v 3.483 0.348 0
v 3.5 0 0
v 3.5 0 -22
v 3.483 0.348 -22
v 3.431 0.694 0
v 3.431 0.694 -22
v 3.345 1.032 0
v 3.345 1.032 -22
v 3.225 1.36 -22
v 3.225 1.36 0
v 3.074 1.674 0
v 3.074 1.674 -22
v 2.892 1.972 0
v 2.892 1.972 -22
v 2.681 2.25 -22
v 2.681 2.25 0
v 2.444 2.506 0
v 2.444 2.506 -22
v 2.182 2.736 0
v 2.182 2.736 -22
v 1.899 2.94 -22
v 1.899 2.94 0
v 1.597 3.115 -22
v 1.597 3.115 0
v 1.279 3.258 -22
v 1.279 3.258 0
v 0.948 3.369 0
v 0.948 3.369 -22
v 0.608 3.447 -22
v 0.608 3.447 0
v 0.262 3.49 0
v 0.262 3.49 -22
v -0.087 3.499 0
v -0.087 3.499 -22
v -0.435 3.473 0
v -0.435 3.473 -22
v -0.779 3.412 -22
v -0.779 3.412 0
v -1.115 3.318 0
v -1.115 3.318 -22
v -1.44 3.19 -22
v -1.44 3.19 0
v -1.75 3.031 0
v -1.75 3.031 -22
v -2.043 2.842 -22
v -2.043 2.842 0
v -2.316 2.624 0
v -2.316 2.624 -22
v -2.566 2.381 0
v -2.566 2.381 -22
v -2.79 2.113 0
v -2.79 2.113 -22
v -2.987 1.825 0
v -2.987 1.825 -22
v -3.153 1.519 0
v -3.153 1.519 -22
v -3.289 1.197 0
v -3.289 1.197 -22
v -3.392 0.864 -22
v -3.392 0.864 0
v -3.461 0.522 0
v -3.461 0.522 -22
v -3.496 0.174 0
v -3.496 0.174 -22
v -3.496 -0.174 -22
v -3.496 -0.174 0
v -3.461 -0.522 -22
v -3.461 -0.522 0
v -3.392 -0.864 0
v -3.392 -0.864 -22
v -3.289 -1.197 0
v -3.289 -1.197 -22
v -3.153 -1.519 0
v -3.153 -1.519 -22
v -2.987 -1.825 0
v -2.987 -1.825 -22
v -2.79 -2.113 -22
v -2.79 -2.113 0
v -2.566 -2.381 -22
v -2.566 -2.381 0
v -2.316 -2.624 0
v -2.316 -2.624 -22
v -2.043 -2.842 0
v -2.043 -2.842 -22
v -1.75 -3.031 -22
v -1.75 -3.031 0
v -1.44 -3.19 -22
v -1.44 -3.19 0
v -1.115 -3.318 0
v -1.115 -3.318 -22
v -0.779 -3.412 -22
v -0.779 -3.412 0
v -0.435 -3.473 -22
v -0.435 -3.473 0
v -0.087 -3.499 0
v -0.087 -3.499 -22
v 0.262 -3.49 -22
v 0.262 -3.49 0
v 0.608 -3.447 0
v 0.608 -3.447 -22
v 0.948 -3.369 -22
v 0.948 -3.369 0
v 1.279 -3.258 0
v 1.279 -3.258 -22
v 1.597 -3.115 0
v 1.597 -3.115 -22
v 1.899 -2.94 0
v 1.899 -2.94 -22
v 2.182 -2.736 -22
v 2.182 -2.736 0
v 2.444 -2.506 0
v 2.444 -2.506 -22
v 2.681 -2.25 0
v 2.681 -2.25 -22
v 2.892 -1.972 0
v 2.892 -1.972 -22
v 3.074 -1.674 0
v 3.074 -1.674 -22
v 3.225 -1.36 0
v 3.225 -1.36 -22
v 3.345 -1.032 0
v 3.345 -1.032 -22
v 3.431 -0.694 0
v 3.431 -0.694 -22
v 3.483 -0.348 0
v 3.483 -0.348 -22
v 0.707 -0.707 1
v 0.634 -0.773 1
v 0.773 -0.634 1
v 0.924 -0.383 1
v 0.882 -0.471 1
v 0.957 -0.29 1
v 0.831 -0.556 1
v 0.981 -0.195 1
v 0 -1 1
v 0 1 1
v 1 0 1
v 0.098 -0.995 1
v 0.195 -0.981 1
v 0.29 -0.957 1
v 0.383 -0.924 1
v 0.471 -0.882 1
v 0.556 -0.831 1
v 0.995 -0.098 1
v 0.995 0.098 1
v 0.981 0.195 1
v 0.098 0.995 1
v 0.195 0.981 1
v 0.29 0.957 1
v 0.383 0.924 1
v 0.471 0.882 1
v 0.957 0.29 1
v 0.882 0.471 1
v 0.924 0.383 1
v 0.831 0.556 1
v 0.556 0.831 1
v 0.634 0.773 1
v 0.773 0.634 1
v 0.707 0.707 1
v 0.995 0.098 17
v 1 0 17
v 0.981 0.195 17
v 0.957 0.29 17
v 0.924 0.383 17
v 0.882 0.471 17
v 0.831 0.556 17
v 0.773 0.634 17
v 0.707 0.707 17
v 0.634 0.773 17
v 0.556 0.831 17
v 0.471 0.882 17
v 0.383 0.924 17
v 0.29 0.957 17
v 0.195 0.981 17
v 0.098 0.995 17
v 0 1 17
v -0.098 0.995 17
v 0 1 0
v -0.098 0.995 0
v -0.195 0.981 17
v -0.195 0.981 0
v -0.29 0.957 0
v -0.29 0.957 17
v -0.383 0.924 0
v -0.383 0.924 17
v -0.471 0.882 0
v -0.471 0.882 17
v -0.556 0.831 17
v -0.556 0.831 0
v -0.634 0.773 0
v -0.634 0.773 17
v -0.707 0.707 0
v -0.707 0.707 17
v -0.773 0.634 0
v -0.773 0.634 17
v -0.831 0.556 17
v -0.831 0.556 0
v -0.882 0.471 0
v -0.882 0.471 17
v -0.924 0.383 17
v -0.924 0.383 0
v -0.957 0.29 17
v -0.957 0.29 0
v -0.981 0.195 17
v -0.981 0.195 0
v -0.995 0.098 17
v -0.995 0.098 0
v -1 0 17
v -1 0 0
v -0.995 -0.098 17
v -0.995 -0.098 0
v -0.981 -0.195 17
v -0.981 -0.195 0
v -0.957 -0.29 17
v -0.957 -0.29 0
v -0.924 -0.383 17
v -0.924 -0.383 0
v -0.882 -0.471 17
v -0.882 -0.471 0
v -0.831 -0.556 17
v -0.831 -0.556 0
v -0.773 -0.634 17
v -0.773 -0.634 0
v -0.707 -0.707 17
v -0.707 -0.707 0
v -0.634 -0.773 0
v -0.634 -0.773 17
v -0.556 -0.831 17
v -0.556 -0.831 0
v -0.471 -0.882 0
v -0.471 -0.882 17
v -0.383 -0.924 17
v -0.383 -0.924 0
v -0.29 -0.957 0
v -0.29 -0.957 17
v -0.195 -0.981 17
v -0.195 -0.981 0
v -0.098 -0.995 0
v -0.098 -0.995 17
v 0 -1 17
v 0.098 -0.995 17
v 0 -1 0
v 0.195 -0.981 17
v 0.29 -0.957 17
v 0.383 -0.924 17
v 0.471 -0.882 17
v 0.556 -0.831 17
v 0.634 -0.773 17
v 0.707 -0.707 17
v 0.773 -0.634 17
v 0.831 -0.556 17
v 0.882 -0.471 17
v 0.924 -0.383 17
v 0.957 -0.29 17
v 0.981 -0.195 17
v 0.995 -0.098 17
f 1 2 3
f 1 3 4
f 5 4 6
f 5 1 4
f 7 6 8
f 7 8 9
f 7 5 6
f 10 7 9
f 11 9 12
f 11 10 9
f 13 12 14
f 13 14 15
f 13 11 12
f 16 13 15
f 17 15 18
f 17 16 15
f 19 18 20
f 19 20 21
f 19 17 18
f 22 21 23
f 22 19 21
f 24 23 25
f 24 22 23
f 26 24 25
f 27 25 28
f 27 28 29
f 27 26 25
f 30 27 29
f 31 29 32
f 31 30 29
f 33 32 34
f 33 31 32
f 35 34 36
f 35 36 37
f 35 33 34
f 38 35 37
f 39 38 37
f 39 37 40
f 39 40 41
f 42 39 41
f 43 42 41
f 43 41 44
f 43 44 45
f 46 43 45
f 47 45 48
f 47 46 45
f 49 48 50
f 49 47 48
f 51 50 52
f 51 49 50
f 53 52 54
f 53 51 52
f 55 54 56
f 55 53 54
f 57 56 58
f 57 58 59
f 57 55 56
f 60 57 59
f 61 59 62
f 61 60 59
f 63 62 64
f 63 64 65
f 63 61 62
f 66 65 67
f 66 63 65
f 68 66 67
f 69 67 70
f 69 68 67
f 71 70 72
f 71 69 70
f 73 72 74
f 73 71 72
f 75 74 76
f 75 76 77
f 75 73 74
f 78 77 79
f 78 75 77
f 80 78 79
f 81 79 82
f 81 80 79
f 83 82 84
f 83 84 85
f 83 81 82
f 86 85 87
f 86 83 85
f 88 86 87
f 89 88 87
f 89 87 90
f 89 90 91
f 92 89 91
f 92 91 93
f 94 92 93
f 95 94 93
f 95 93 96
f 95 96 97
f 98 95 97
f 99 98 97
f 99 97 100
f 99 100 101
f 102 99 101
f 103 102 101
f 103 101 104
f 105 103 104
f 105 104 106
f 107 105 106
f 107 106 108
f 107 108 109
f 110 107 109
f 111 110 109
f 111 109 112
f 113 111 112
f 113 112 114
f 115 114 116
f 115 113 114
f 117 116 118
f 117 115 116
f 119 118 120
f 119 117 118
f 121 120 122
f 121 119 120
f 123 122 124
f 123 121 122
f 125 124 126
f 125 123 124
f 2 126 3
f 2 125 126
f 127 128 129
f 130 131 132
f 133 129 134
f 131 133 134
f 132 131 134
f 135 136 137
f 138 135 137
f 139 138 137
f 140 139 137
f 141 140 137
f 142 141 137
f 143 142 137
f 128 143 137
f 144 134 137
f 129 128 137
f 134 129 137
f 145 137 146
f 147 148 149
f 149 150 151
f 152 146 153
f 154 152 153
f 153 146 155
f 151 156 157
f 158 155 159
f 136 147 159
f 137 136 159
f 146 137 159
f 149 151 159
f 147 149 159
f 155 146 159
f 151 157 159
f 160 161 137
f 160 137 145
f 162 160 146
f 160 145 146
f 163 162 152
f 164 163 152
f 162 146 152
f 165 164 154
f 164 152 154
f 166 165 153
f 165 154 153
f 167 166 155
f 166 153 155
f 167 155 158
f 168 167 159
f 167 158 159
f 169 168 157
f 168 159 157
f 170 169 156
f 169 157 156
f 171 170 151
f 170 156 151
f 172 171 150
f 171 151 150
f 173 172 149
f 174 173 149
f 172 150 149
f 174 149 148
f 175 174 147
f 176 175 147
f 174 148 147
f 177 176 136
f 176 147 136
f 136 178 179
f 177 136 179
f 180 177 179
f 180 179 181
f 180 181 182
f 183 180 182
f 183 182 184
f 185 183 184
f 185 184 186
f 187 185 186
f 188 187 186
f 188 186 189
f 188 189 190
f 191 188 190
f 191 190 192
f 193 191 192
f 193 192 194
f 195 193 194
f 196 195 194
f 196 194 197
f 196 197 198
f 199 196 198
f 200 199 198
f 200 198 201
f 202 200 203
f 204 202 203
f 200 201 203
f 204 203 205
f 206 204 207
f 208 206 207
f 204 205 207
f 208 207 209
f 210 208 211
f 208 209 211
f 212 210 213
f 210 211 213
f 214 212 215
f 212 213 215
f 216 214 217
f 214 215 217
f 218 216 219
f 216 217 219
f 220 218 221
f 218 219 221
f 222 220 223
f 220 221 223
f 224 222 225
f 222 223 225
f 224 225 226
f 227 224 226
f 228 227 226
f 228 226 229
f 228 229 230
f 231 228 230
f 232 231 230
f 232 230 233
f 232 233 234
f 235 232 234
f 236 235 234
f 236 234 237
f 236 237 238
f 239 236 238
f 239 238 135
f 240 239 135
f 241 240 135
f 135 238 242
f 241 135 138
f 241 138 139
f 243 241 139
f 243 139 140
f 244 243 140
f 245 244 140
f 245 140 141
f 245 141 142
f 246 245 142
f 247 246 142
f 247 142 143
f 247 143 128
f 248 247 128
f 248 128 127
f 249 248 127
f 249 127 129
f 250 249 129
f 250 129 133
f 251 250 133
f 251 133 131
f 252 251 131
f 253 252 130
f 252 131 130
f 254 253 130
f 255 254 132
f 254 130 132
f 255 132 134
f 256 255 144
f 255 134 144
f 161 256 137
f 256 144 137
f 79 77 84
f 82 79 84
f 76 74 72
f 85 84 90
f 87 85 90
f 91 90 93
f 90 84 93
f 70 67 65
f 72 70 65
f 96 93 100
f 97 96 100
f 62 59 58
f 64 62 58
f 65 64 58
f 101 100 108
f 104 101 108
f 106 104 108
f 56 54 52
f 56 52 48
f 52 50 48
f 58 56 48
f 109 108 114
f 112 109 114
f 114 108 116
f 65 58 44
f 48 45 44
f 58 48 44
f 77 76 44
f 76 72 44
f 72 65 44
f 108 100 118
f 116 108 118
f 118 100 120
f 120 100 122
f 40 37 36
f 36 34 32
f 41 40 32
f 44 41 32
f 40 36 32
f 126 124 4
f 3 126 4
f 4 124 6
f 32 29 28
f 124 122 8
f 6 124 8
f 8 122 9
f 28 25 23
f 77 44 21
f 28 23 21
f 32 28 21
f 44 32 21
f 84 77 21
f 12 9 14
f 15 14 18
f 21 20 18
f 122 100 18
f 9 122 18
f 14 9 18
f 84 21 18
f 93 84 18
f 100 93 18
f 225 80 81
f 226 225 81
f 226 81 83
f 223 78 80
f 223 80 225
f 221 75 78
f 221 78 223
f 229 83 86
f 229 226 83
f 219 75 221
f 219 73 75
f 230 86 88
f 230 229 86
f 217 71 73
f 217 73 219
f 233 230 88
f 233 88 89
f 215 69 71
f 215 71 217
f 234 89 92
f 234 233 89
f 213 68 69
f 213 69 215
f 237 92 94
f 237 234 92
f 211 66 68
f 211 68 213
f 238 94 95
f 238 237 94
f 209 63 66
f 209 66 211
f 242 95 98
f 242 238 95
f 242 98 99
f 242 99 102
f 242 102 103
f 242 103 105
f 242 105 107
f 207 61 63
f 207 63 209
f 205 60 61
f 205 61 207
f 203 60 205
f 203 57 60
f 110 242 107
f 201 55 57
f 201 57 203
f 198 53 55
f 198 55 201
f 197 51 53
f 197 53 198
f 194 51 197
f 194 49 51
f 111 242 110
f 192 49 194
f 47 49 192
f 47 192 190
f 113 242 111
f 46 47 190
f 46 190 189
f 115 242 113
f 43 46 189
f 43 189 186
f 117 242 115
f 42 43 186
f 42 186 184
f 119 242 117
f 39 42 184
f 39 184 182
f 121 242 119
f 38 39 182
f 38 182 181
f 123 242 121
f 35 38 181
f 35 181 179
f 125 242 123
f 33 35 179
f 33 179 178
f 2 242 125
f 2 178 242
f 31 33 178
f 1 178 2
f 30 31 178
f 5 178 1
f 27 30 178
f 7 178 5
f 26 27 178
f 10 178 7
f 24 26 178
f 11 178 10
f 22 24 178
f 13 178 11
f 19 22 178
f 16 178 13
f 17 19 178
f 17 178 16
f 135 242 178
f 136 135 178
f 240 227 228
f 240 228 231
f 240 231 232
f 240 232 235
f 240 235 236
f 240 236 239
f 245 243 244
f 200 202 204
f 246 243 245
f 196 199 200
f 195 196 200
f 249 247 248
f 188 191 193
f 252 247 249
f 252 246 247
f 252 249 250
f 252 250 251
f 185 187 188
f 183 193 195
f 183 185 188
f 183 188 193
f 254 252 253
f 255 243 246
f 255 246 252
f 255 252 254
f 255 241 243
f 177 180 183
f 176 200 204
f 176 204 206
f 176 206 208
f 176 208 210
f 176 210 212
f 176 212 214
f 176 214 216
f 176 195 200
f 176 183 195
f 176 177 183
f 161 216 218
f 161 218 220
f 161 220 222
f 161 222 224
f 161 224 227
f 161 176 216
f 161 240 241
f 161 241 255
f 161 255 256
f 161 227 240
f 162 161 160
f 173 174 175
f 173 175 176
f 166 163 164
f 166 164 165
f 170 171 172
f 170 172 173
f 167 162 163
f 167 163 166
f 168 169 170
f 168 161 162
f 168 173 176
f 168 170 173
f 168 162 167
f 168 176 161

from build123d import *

# Parameters (mm, degrees)
F0_R     = 3.5
F1_DEPTH = 22
F2_START = 1
F2_DEPTH = 16
F3_DEPTH = 1


# Not quite as in the source:
# - a feature names something its author has since deleted; it is built from what else it names


with BuildPart() as f1:
    # F0 (on Top) → F1 (new body)
    with BuildSketch(Plane.XY):
        Circle(F0_R)
        with BuildLine():
            ThreePointArc((0, 1), (0.7071067812, 0.7071067812), (1, 0))
            ThreePointArc((1, 0), (0.7071067812, -0.7071067812), (0, -1))
            ThreePointArc((0, -1), (-1, 0), (0, 1))
        make_face(mode=Mode.SUBTRACT)
        with BuildLine():
            Line((0, 0), (0, 1))
            ThreePointArc((0, 1), (-1, 0), (0, -1))
            Line((0, -1), (0, 0))
        make_face()
        with BuildLine():
            ThreePointArc((0, -1), (0.7071067812, -0.7071067812), (1, 0))
            ThreePointArc((1, 0), (0.7071067812, 0.7071067812), (0, 1))
            Line((0, 1), (0, 0))
            Line((0, 0), (0, -1))
        make_face()
    extrude(amount=-F1_DEPTH)



with BuildPart() as f2:
    # F0 (on Top) → F2 (new body)
    with BuildSketch(Plane.XY.offset(F2_START)):
        with BuildLine():
            Line((0, 0), (0, 1))
            ThreePointArc((0, 1), (-1, 0), (0, -1))
            Line((0, -1), (0, 0))
        make_face()
        with BuildLine():
            ThreePointArc((0, -1), (0.7071067812, -0.7071067812), (1, 0))
            ThreePointArc((1, 0), (0.7071067812, 0.7071067812), (0, 1))
            Line((0, 1), (0, 0))
            Line((0, 0), (0, -1))
        make_face()
    extrude(amount=F2_DEPTH)


with BuildPart() as f1_1:
    add(f1.part)

    add(f2.part)  # F3 merges F2
    # F0 (on Top) → F3 (join)
    with BuildSketch(Plane.XY):
        with BuildLine():
            Line((0, 0), (0, 1))
            ThreePointArc((0, 1), (-1, 0), (0, -1))
            Line((0, -1), (0, 0))
        make_face()
    extrude(amount=F3_DEPTH)


solid = f1_1.part
